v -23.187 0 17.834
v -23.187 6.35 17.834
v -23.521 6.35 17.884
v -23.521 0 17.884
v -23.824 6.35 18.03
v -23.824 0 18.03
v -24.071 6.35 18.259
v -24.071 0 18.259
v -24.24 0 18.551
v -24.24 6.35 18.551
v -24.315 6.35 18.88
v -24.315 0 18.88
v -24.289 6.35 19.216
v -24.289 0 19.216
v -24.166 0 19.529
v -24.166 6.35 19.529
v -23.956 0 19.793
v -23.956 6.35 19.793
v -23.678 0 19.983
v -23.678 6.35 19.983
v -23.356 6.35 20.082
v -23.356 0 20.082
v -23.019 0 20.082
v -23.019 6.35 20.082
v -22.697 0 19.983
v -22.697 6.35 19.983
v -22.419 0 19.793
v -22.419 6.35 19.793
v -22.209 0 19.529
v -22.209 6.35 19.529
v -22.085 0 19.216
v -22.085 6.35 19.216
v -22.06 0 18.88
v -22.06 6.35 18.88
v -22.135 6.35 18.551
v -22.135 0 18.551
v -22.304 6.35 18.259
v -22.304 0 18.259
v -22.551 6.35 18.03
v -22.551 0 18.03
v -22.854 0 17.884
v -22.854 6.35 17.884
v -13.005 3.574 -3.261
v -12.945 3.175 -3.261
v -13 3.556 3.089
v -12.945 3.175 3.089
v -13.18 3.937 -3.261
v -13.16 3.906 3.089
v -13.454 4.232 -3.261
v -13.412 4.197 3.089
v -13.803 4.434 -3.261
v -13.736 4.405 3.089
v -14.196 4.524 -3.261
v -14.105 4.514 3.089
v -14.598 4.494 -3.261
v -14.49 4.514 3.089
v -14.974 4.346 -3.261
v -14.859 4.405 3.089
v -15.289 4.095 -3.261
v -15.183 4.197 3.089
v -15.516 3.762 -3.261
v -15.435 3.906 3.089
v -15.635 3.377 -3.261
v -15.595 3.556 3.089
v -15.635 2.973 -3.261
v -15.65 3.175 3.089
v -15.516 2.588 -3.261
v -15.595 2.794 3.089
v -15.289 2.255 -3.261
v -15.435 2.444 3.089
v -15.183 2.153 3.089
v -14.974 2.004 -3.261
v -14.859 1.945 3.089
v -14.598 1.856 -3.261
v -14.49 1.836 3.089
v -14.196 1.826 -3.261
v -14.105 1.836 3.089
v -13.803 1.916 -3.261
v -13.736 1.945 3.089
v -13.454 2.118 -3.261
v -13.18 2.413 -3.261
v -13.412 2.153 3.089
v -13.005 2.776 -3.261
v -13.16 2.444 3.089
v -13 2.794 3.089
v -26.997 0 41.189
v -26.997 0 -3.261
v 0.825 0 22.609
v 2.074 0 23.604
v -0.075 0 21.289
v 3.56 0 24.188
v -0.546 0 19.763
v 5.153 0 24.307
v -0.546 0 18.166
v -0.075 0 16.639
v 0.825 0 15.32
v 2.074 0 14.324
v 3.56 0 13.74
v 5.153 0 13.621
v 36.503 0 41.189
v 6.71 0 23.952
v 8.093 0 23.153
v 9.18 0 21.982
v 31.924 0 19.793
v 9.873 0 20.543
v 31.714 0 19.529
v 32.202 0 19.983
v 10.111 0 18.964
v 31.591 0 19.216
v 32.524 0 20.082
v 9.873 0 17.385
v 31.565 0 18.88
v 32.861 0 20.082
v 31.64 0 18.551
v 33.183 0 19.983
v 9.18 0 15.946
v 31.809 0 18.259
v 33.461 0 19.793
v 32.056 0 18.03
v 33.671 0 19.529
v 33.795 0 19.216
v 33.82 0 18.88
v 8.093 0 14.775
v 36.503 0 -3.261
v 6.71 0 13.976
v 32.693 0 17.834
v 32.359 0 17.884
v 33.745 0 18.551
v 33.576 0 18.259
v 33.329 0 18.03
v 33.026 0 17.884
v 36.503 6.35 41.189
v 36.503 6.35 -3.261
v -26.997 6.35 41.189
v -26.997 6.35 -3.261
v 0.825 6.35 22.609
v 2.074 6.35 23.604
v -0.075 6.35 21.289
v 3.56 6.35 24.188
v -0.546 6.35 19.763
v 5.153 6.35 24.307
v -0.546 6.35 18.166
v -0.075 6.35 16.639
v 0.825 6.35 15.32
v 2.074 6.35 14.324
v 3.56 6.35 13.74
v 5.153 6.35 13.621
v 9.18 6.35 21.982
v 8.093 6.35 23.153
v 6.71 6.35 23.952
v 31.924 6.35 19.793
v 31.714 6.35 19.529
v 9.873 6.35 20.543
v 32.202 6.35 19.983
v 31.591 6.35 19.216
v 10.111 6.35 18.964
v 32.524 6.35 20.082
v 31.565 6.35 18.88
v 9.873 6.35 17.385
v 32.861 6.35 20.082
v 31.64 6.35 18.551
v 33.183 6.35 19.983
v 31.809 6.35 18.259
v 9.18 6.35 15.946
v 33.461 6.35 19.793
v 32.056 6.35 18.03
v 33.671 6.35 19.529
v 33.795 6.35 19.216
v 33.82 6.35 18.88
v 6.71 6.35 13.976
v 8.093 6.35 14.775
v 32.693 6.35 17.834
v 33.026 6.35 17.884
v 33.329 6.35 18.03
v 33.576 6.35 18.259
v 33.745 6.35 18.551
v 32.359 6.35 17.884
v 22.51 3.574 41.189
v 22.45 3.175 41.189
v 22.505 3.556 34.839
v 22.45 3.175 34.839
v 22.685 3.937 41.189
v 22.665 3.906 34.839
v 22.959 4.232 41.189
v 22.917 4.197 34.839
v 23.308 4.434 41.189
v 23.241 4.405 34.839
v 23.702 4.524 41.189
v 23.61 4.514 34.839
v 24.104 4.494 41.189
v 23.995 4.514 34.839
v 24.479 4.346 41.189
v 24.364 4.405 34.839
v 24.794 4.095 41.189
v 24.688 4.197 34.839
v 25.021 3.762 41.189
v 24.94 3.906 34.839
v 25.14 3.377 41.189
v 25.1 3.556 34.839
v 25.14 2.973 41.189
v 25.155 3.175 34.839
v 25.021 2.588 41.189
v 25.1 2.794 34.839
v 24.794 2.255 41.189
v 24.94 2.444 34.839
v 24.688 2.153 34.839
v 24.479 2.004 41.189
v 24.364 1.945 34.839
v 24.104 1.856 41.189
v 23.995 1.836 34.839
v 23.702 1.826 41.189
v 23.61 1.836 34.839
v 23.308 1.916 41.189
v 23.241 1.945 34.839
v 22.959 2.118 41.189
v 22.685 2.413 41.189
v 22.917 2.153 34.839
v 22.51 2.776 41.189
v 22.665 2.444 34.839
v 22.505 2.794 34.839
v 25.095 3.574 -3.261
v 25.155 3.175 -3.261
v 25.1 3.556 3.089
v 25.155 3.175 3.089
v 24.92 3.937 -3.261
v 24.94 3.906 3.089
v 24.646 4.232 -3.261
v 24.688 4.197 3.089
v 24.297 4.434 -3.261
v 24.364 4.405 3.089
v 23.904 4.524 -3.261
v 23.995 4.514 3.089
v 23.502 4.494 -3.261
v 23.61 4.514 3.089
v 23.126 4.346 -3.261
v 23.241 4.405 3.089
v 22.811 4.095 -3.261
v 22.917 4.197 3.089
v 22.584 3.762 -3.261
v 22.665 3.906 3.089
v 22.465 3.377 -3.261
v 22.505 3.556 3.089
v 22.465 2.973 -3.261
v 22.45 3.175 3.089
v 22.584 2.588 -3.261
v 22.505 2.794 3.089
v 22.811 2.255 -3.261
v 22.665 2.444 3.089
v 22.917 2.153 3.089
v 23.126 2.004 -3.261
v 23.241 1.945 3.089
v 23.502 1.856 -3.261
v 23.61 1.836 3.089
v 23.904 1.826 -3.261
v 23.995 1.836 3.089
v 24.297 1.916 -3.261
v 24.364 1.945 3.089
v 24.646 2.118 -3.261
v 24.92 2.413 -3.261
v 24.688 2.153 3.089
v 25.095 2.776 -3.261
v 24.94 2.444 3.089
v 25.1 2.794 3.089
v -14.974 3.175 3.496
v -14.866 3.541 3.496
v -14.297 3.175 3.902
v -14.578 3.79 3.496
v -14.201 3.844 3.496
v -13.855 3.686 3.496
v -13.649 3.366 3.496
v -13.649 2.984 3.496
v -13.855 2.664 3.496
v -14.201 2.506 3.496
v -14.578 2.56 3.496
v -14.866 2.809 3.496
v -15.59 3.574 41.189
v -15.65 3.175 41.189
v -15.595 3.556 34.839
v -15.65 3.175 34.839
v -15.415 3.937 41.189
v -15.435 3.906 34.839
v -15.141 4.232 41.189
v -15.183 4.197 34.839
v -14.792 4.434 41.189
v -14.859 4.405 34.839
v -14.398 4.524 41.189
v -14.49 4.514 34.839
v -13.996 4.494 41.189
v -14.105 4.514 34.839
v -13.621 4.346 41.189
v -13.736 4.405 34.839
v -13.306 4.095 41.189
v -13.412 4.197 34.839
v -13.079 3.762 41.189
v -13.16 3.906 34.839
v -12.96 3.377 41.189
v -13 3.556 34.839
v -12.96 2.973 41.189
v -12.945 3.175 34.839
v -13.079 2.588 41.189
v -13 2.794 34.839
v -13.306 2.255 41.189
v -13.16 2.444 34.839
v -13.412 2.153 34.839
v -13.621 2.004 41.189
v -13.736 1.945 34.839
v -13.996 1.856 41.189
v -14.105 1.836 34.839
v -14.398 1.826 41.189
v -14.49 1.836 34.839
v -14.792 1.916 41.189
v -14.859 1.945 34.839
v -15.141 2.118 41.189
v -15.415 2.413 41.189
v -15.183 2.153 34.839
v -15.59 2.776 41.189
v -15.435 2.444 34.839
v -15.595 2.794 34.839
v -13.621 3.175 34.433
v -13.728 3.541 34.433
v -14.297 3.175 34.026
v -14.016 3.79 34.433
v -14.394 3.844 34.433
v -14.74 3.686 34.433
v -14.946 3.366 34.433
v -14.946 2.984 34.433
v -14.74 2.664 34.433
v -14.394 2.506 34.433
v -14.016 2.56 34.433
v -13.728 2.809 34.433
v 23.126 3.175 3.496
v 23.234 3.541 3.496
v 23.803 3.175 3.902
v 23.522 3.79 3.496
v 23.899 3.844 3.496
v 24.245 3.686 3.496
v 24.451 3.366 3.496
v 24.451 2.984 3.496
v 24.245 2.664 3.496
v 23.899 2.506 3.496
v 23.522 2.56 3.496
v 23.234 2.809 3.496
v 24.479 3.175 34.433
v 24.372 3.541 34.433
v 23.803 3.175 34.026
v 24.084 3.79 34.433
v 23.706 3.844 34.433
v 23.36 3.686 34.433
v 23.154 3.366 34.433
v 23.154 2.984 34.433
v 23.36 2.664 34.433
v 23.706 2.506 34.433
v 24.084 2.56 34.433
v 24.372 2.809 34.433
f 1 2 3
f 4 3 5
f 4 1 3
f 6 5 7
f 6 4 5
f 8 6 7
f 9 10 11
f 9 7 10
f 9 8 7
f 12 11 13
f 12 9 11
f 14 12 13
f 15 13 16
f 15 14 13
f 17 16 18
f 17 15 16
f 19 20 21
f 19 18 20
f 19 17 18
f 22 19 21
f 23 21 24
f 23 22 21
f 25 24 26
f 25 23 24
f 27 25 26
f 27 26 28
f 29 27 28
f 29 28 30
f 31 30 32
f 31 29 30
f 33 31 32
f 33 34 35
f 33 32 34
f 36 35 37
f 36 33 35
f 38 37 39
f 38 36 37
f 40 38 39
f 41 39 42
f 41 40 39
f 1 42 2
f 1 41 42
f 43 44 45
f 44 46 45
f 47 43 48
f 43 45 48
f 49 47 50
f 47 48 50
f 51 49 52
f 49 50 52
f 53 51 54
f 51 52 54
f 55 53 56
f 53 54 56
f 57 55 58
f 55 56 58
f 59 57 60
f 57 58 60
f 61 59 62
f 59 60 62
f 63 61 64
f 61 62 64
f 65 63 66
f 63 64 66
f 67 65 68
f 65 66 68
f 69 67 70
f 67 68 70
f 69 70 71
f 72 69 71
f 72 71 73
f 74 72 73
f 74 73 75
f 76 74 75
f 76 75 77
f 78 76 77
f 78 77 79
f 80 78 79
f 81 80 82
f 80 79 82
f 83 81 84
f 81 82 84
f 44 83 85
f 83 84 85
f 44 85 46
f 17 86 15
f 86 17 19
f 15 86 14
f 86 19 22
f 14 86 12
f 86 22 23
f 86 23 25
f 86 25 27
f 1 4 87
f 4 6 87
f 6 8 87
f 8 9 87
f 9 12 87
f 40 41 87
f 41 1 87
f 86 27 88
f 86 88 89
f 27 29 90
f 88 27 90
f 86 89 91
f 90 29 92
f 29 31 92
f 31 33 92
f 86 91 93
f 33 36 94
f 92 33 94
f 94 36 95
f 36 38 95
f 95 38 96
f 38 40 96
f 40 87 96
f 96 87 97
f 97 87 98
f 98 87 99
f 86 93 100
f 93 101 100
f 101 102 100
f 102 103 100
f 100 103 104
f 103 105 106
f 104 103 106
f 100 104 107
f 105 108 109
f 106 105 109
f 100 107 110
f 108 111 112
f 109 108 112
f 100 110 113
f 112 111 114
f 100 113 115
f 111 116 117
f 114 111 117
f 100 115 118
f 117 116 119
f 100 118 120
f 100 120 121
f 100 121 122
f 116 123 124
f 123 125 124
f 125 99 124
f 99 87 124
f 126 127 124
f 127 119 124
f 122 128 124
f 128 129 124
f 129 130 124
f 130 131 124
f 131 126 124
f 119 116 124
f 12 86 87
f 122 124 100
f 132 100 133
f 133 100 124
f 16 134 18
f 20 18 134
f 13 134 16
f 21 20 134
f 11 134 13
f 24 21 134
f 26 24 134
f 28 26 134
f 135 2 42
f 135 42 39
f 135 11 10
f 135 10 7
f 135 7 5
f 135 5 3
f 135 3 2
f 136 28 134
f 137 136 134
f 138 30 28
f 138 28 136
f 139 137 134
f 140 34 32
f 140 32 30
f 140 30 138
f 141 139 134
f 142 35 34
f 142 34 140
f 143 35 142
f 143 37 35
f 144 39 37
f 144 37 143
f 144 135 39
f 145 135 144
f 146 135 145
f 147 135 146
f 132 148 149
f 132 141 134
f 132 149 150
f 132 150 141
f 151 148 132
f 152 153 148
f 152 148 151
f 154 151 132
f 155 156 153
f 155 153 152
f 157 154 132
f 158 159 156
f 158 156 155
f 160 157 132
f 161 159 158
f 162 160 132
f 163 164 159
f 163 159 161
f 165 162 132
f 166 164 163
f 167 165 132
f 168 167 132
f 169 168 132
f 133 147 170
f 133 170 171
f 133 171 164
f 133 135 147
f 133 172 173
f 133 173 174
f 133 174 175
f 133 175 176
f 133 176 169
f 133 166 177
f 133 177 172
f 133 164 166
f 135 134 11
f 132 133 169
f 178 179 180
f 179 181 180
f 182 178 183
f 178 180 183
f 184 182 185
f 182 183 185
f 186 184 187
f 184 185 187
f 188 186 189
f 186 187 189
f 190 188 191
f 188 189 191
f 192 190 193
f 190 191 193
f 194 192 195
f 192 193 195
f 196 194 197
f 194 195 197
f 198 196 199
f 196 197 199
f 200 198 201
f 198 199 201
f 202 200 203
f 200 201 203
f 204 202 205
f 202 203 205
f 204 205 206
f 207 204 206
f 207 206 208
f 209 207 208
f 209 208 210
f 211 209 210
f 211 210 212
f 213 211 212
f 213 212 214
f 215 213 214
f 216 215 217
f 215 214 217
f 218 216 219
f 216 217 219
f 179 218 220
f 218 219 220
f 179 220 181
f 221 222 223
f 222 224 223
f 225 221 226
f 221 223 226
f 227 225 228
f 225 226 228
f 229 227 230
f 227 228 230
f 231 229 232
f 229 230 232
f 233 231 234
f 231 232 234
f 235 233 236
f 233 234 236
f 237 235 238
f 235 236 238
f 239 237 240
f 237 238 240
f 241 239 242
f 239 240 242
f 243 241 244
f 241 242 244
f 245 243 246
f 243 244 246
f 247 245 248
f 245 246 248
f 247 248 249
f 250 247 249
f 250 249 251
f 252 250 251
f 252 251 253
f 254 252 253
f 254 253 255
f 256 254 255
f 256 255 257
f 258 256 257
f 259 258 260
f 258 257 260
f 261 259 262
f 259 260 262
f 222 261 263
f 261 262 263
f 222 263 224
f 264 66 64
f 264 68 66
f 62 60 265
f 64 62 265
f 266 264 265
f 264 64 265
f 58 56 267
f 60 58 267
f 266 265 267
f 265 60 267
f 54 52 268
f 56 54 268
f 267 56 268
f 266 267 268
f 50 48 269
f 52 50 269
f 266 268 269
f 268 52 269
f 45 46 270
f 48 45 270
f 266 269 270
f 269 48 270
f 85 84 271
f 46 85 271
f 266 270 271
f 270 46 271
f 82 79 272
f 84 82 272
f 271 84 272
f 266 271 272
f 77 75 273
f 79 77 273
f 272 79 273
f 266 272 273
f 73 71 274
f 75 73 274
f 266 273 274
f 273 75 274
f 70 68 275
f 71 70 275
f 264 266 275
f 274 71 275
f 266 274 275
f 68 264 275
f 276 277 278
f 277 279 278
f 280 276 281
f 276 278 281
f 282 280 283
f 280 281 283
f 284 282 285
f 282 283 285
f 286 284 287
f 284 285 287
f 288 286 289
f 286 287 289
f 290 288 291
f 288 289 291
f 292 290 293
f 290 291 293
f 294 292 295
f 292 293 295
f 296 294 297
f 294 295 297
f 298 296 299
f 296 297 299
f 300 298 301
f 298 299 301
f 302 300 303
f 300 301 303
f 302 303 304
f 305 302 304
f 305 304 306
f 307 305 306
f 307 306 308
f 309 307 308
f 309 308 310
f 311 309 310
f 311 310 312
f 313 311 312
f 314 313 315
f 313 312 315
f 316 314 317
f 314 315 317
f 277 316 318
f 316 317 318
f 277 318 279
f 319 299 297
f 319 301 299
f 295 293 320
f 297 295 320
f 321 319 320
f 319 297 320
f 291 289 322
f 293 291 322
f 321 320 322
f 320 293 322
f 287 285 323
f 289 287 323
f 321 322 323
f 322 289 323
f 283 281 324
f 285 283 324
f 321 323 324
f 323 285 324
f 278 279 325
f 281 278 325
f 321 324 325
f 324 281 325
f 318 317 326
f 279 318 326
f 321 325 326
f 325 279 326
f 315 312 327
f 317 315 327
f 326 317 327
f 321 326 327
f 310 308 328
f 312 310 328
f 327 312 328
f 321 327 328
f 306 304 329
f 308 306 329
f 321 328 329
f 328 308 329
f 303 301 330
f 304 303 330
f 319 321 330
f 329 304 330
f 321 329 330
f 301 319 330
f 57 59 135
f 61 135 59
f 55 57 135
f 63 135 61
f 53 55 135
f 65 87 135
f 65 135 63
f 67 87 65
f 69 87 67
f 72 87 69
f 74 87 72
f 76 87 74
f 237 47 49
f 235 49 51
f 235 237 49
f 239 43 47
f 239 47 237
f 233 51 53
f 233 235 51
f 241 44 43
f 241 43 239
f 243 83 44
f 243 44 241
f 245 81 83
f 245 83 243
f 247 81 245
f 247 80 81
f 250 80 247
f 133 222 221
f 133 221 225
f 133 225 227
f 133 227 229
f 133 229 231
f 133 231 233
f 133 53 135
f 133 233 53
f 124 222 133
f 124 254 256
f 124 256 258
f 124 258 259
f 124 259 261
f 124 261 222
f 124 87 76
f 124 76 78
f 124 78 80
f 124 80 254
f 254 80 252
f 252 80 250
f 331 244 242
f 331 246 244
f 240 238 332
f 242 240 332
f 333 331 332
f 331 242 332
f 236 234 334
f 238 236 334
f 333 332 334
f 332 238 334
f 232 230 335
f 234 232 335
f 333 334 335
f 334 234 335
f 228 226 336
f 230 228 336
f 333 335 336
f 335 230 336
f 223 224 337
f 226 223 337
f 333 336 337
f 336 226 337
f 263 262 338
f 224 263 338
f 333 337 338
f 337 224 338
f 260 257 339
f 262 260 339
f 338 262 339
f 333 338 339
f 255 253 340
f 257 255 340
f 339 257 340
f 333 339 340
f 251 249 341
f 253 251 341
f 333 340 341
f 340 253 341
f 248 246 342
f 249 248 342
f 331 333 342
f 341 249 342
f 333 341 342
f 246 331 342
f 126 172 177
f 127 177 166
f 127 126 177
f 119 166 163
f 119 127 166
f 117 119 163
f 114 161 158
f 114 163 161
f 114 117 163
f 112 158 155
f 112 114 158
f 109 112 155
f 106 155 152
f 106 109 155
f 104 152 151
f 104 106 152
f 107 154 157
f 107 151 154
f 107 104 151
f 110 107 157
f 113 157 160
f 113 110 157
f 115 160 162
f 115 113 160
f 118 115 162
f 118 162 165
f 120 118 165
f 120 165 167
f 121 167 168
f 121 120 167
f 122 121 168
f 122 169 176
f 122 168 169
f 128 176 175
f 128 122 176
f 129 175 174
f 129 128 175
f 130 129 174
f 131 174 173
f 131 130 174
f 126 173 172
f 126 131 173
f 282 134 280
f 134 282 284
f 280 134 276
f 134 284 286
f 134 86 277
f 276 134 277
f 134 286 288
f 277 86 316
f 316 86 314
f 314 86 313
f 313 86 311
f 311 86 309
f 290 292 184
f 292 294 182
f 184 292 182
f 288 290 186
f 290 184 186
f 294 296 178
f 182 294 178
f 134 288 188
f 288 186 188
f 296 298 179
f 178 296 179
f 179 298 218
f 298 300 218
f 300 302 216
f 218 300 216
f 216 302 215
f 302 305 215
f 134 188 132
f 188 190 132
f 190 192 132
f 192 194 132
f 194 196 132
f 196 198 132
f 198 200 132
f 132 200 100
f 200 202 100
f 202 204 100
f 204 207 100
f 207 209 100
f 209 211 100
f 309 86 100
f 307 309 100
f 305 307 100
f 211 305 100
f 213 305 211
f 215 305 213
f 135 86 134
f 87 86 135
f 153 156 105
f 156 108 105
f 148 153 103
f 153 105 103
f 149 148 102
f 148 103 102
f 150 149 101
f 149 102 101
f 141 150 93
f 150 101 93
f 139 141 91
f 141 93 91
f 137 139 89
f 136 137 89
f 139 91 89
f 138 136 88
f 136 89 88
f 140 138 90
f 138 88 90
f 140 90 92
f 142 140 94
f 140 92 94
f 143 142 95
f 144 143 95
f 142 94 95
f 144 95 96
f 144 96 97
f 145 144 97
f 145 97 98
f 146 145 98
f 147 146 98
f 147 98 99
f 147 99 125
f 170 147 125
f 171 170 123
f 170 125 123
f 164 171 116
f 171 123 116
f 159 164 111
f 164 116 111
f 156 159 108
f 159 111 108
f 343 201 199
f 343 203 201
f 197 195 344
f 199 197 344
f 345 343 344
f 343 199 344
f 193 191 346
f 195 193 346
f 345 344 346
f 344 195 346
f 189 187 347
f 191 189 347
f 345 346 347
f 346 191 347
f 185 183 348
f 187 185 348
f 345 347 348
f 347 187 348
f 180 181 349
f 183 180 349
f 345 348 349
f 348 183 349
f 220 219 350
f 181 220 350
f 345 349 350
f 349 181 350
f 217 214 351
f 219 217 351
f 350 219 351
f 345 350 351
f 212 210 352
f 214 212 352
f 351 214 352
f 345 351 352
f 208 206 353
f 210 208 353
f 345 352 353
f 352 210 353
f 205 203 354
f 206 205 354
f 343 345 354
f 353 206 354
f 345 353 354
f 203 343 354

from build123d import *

# Parameters (mm, degrees)
SKETCH1_W                       = 63.5
SKETCH1_H                       = 44.45
BOSS_EXTRUDE1_DEPTH             = 6.35
LPATTERN1_COUNT                 = 2
LPATTERN1_PITCH                 = 55.88
TAP_DRILL_FOR_6_32_TAP1_D       = 2.7051
TAP_DRILL_FOR_6_32_TAP1_DEPTH   = 6.35
TAP_DRILL_FOR_6_32_TAP1_TIP     = 0.81269403
TAP_DRILL_FOR_6_32_TAP2_D       = 2.7051
TAP_DRILL_FOR_6_32_TAP2_DEPTH   = 6.35
TAP_DRILL_FOR_6_32_TAP2_TIP     = 0.81269403
TAP_DRILL_FOR_1_2_13_TAP1_D     = 10.71626
TAP_DRILL_FOR_1_2_13_TAP1_DEPTH = 6.35
TAP_DRILL_FOR_1_2_13_TAP1_TIP   = 3.219489309


with BuildPart() as part:
    # Sketch1 → Boss-Extrude1 (new body)
    with BuildSketch(Plane(origin=(0, 0, 0), x_dir=(1, 0, 0), z_dir=(0, 1, 0))):
        with Locations((4.75259427, -18.964156798)):
            Rectangle(SKETCH1_W, SKETCH1_H)
    extrude(amount=BOSS_EXTRUDE1_DEPTH)

    # Sketch16 → Tap Drill for #4-40 Tap1 (revolve, cut)
    with BuildSketch(Plane(origin=(-23.18740573, 0, 18.964156798), x_dir=(0, 0, -1), z_dir=(1, 0, 0))):
        Polygon((0, 0), (0, 13.379152758), (1.1303, 12.7), (1.1303, 0), align=None)
    tap_drill_for_4_40_tap1 = revolve(axis=Axis((-23.18740573, -6.35, 18.964156798), (0, 1, 0)), mode=Mode.SUBTRACT)

    # LPattern1: Tap Drill for #4-40 Tap1 ×2
    with Locations(*[(i * LPATTERN1_PITCH, 0, 0) for i in range(1, LPATTERN1_COUNT)]):
        add(tap_drill_for_4_40_tap1, mode=Mode.SUBTRACT)

    # Tap Drill for #6-32 Tap1
    with Locations(Plane.XY.offset(41.189156798)):
        with Locations((23.80259427, 3.175), (-14.29740573, 3.175)):
            Hole(TAP_DRILL_FOR_6_32_TAP1_D / 2, depth=TAP_DRILL_FOR_6_32_TAP1_DEPTH)
            with Locations((0, 0, -(TAP_DRILL_FOR_6_32_TAP1_DEPTH + TAP_DRILL_FOR_6_32_TAP1_TIP / 2))):  # 118° drill point
                Cone(0, TAP_DRILL_FOR_6_32_TAP1_D / 2, TAP_DRILL_FOR_6_32_TAP1_TIP, mode=Mode.SUBTRACT)

    # Tap Drill for #6-32 Tap2
    with Locations(Plane(origin=(0, 0, -3.260843202), x_dir=(-1, 0, 0), z_dir=(0, 0, -1))):
        with Locations((14.29740573, 3.175), (-23.80259427, 3.175)):
            Hole(TAP_DRILL_FOR_6_32_TAP2_D / 2, depth=TAP_DRILL_FOR_6_32_TAP2_DEPTH)
            with Locations((0, 0, -(TAP_DRILL_FOR_6_32_TAP2_DEPTH + TAP_DRILL_FOR_6_32_TAP2_TIP / 2))):  # 118° drill point
                Cone(0, TAP_DRILL_FOR_6_32_TAP2_D / 2, TAP_DRILL_FOR_6_32_TAP2_TIP, mode=Mode.SUBTRACT)

    # Tap Drill for 1/2-13 Tap1
    with Locations(Plane(origin=(0, 6.35, 0), x_dir=(-1, 0, 0), z_dir=(0, 1, 0))):
        with Locations((-4.75259427, 18.964156798)):
            Hole(TAP_DRILL_FOR_1_2_13_TAP1_D / 2, depth=TAP_DRILL_FOR_1_2_13_TAP1_DEPTH)
            with Locations((0, 0, -(TAP_DRILL_FOR_1_2_13_TAP1_DEPTH + TAP_DRILL_FOR_1_2_13_TAP1_TIP / 2))):  # 118° drill point
                Cone(0, TAP_DRILL_FOR_1_2_13_TAP1_D / 2, TAP_DRILL_FOR_1_2_13_TAP1_TIP, mode=Mode.SUBTRACT)


solid = part.part
